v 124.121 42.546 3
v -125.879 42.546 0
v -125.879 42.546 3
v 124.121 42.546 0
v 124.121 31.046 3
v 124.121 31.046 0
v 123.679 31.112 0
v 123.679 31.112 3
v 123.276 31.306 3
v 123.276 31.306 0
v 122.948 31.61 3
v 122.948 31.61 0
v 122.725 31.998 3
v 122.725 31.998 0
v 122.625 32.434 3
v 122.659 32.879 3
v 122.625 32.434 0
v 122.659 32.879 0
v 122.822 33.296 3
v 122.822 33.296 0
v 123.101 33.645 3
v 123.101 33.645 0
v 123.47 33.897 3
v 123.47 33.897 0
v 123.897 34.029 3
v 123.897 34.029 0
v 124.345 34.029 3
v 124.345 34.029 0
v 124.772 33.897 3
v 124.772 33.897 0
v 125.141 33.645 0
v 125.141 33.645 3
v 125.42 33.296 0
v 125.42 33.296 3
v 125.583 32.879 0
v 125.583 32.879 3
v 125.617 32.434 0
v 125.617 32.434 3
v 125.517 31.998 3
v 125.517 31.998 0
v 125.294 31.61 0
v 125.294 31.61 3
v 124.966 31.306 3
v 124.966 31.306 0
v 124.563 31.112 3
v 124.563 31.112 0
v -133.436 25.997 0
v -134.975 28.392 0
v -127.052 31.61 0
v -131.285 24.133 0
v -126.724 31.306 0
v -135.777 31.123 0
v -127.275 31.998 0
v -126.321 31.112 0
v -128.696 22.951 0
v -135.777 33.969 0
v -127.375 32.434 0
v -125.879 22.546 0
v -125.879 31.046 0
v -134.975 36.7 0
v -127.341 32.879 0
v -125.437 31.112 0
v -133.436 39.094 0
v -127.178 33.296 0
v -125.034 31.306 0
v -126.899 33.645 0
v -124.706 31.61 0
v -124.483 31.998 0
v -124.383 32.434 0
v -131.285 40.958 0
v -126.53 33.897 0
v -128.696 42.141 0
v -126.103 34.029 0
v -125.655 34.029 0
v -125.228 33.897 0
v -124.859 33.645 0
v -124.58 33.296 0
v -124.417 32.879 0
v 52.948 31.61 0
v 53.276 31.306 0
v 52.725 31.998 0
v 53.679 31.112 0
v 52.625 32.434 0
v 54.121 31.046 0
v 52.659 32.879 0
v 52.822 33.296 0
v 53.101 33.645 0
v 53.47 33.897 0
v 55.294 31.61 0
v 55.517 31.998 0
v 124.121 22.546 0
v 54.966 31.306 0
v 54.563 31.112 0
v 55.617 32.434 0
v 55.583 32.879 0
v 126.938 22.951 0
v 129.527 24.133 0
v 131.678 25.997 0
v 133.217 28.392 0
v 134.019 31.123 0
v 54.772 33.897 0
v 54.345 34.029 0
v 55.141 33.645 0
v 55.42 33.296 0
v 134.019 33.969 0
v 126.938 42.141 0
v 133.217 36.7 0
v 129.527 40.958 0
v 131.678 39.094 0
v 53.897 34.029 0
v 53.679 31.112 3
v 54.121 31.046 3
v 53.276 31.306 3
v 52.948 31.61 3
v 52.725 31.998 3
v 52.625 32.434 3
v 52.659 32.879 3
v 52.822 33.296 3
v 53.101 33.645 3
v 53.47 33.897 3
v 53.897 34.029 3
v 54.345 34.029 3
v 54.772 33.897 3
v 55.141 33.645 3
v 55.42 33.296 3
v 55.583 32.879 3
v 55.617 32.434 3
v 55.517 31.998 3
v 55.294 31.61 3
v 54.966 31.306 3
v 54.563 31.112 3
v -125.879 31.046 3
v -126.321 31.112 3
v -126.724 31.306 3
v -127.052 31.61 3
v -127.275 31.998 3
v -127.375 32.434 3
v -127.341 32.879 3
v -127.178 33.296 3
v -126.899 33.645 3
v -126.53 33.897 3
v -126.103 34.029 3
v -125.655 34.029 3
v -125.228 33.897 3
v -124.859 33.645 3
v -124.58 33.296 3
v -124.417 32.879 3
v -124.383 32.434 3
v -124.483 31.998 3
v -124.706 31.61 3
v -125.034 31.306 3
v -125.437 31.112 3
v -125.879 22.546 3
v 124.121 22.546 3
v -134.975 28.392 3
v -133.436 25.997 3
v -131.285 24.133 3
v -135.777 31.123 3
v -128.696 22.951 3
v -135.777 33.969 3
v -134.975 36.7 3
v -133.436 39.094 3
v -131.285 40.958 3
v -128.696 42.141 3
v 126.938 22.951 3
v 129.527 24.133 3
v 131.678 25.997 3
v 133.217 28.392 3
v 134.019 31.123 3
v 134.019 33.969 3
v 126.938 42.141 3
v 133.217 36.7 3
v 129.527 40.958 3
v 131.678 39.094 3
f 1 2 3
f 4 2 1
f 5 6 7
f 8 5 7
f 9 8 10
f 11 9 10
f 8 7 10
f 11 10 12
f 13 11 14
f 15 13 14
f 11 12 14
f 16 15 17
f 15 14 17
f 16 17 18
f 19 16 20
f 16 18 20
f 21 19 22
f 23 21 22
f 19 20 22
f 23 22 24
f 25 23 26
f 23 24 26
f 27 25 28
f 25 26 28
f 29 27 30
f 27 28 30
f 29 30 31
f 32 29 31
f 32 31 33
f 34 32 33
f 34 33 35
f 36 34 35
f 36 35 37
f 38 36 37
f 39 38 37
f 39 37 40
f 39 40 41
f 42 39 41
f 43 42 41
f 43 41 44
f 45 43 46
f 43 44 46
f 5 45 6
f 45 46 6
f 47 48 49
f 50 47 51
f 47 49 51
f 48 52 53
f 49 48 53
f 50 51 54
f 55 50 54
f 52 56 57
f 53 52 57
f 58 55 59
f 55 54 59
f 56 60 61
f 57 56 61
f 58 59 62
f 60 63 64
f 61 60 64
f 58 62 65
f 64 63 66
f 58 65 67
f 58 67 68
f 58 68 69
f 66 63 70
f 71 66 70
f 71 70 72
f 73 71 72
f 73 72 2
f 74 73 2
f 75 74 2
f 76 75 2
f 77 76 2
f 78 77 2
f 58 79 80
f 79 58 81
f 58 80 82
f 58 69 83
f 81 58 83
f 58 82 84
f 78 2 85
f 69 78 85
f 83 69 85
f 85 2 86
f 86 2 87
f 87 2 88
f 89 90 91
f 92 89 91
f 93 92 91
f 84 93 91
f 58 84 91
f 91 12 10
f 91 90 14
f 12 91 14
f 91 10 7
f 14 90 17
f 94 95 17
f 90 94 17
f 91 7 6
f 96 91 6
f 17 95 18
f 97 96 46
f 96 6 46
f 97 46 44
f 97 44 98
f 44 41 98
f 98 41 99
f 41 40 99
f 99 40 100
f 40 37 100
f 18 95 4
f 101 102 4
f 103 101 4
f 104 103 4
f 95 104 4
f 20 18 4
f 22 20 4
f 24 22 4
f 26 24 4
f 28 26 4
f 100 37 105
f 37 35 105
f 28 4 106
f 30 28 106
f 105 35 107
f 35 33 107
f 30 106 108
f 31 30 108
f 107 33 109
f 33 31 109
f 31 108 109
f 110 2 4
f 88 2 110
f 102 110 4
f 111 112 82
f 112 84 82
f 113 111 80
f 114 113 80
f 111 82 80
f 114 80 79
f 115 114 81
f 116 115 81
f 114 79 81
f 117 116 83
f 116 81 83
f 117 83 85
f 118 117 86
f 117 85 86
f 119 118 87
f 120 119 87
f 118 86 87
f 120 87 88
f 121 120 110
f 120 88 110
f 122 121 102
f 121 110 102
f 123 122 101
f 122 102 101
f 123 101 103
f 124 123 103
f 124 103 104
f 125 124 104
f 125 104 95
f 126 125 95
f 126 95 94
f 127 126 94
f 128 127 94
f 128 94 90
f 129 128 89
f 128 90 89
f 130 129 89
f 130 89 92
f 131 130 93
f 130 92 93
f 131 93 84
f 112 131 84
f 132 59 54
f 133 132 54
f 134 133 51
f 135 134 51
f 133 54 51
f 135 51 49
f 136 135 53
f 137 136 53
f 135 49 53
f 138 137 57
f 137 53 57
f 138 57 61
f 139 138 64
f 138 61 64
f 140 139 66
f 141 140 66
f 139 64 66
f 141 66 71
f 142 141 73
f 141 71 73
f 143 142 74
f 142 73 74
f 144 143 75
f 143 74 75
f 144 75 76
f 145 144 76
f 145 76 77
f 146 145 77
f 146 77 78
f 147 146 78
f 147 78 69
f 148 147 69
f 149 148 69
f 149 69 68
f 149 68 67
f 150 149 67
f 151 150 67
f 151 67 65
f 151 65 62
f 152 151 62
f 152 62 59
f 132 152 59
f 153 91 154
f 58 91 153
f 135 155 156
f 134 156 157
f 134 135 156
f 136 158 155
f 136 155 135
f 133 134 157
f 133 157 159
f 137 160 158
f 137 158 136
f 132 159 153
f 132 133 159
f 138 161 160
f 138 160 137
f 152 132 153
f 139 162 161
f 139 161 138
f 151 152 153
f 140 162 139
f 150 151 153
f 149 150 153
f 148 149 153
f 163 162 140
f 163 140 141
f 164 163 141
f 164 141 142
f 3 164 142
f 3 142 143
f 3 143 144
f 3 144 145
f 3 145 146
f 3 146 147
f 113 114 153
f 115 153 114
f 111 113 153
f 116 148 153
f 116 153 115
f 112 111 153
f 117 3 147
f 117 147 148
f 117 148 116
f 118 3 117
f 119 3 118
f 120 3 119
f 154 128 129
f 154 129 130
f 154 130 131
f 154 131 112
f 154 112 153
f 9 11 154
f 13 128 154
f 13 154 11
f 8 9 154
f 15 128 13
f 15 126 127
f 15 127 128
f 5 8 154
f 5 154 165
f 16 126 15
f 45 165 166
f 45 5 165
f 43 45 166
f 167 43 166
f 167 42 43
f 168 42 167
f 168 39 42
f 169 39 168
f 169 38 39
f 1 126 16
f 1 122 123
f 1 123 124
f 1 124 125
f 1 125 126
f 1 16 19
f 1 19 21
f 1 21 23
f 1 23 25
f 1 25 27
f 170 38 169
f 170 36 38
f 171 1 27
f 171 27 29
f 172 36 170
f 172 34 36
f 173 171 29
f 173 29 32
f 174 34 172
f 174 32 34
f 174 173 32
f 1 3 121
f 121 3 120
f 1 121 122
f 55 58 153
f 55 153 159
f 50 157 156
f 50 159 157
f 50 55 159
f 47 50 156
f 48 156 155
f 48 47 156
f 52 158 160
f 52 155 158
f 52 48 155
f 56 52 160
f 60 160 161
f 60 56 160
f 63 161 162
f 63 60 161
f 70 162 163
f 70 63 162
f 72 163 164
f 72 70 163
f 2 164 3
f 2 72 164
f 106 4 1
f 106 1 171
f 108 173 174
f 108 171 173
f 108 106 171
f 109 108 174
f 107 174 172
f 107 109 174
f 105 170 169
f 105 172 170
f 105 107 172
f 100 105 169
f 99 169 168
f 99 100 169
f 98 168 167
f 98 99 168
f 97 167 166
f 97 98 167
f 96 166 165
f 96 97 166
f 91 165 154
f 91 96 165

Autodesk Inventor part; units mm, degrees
ref_plane "YZ Plane" through (0, 0, 0) normal (1, 0, 0) x (0, 1, 0)
ref_plane "XZ Plane" through (0, 0, 0) normal (0, 1, 0) x (-1, 0, 0)
ref_plane "XY Plane" through (0, 0, 0) normal (0, 0, 1) x (1, 0, 0)
sketch "Skizze1" plane through (0, 0, 0) normal (0, 0, 1) x (1, 0, 0)
  line L0 (-189.879, 0) -> (188.121, 0) projected
  line L1 (0, -8.5091) -> (0, 51.0549) projected
  line L2 (-125.879, 42.5457) -> (124.121, 42.5457)
  line L3 (124.121, 22.5457) -> (-125.879, 22.5457)
  arc A0 (-125.879, 42.5457) -> (-125.879, 22.5457) centre (-125.879, 32.5457) ccw
  arc A1 (124.121, 22.5457) -> (124.121, 42.5457) centre (124.121, 32.5457) ccw
  point P0 (0, 0)
  dimension "d5" = 250
  dimension "d6" = 20
extrude "Extrusion1" add sketch "Skizze1" along normal blind 3
sketch "Skizze2" plane through (0, 0, 3) normal (0, 0, 1) x (1, 0, 0)
  arc A0 (124.121, 22.5457) -> (124.121, 42.5457) centre (124.121, 32.5457) ccw projected
  line L0 (124.121, 42.5457) -> (-125.879, 42.5457) projected
  arc A1 (-125.879, 42.5457) -> (-125.879, 22.5457) centre (-125.879, 32.5457) ccw projected
  point P0 (0, 0)
  point P1 (-125.879, 32.5457)
  dimension "d9" = 10
  dimension "d10" = 0
hole "Bohrung1" at (-125.879, 32.5457, 3) at (124.121, 32.5457, 3) direction (0, 0, -1) diameter 3 depth 57.1 tip angle 118
sketch "Skizze3" plane through (0, 0, 3) normal (0, 0, 1) x (1, 0, 0)
  circle A0 centre (124.121, 32.5457) radius 1.5 projected
  line L0 (124.121, 42.5457) -> (-125.879, 42.5457) projected
  point P0 (0, 0)
  point P1 (54.121, 32.5457)
  dimension "d18" = 70
  dimension "d19" = 10
hole "Bohrung2" at (54.121, 32.5457, 3) direction (0, 0, -1) diameter 3 depth 57.1 tip angle 118
properties part number "Träger vorne oben lang"
